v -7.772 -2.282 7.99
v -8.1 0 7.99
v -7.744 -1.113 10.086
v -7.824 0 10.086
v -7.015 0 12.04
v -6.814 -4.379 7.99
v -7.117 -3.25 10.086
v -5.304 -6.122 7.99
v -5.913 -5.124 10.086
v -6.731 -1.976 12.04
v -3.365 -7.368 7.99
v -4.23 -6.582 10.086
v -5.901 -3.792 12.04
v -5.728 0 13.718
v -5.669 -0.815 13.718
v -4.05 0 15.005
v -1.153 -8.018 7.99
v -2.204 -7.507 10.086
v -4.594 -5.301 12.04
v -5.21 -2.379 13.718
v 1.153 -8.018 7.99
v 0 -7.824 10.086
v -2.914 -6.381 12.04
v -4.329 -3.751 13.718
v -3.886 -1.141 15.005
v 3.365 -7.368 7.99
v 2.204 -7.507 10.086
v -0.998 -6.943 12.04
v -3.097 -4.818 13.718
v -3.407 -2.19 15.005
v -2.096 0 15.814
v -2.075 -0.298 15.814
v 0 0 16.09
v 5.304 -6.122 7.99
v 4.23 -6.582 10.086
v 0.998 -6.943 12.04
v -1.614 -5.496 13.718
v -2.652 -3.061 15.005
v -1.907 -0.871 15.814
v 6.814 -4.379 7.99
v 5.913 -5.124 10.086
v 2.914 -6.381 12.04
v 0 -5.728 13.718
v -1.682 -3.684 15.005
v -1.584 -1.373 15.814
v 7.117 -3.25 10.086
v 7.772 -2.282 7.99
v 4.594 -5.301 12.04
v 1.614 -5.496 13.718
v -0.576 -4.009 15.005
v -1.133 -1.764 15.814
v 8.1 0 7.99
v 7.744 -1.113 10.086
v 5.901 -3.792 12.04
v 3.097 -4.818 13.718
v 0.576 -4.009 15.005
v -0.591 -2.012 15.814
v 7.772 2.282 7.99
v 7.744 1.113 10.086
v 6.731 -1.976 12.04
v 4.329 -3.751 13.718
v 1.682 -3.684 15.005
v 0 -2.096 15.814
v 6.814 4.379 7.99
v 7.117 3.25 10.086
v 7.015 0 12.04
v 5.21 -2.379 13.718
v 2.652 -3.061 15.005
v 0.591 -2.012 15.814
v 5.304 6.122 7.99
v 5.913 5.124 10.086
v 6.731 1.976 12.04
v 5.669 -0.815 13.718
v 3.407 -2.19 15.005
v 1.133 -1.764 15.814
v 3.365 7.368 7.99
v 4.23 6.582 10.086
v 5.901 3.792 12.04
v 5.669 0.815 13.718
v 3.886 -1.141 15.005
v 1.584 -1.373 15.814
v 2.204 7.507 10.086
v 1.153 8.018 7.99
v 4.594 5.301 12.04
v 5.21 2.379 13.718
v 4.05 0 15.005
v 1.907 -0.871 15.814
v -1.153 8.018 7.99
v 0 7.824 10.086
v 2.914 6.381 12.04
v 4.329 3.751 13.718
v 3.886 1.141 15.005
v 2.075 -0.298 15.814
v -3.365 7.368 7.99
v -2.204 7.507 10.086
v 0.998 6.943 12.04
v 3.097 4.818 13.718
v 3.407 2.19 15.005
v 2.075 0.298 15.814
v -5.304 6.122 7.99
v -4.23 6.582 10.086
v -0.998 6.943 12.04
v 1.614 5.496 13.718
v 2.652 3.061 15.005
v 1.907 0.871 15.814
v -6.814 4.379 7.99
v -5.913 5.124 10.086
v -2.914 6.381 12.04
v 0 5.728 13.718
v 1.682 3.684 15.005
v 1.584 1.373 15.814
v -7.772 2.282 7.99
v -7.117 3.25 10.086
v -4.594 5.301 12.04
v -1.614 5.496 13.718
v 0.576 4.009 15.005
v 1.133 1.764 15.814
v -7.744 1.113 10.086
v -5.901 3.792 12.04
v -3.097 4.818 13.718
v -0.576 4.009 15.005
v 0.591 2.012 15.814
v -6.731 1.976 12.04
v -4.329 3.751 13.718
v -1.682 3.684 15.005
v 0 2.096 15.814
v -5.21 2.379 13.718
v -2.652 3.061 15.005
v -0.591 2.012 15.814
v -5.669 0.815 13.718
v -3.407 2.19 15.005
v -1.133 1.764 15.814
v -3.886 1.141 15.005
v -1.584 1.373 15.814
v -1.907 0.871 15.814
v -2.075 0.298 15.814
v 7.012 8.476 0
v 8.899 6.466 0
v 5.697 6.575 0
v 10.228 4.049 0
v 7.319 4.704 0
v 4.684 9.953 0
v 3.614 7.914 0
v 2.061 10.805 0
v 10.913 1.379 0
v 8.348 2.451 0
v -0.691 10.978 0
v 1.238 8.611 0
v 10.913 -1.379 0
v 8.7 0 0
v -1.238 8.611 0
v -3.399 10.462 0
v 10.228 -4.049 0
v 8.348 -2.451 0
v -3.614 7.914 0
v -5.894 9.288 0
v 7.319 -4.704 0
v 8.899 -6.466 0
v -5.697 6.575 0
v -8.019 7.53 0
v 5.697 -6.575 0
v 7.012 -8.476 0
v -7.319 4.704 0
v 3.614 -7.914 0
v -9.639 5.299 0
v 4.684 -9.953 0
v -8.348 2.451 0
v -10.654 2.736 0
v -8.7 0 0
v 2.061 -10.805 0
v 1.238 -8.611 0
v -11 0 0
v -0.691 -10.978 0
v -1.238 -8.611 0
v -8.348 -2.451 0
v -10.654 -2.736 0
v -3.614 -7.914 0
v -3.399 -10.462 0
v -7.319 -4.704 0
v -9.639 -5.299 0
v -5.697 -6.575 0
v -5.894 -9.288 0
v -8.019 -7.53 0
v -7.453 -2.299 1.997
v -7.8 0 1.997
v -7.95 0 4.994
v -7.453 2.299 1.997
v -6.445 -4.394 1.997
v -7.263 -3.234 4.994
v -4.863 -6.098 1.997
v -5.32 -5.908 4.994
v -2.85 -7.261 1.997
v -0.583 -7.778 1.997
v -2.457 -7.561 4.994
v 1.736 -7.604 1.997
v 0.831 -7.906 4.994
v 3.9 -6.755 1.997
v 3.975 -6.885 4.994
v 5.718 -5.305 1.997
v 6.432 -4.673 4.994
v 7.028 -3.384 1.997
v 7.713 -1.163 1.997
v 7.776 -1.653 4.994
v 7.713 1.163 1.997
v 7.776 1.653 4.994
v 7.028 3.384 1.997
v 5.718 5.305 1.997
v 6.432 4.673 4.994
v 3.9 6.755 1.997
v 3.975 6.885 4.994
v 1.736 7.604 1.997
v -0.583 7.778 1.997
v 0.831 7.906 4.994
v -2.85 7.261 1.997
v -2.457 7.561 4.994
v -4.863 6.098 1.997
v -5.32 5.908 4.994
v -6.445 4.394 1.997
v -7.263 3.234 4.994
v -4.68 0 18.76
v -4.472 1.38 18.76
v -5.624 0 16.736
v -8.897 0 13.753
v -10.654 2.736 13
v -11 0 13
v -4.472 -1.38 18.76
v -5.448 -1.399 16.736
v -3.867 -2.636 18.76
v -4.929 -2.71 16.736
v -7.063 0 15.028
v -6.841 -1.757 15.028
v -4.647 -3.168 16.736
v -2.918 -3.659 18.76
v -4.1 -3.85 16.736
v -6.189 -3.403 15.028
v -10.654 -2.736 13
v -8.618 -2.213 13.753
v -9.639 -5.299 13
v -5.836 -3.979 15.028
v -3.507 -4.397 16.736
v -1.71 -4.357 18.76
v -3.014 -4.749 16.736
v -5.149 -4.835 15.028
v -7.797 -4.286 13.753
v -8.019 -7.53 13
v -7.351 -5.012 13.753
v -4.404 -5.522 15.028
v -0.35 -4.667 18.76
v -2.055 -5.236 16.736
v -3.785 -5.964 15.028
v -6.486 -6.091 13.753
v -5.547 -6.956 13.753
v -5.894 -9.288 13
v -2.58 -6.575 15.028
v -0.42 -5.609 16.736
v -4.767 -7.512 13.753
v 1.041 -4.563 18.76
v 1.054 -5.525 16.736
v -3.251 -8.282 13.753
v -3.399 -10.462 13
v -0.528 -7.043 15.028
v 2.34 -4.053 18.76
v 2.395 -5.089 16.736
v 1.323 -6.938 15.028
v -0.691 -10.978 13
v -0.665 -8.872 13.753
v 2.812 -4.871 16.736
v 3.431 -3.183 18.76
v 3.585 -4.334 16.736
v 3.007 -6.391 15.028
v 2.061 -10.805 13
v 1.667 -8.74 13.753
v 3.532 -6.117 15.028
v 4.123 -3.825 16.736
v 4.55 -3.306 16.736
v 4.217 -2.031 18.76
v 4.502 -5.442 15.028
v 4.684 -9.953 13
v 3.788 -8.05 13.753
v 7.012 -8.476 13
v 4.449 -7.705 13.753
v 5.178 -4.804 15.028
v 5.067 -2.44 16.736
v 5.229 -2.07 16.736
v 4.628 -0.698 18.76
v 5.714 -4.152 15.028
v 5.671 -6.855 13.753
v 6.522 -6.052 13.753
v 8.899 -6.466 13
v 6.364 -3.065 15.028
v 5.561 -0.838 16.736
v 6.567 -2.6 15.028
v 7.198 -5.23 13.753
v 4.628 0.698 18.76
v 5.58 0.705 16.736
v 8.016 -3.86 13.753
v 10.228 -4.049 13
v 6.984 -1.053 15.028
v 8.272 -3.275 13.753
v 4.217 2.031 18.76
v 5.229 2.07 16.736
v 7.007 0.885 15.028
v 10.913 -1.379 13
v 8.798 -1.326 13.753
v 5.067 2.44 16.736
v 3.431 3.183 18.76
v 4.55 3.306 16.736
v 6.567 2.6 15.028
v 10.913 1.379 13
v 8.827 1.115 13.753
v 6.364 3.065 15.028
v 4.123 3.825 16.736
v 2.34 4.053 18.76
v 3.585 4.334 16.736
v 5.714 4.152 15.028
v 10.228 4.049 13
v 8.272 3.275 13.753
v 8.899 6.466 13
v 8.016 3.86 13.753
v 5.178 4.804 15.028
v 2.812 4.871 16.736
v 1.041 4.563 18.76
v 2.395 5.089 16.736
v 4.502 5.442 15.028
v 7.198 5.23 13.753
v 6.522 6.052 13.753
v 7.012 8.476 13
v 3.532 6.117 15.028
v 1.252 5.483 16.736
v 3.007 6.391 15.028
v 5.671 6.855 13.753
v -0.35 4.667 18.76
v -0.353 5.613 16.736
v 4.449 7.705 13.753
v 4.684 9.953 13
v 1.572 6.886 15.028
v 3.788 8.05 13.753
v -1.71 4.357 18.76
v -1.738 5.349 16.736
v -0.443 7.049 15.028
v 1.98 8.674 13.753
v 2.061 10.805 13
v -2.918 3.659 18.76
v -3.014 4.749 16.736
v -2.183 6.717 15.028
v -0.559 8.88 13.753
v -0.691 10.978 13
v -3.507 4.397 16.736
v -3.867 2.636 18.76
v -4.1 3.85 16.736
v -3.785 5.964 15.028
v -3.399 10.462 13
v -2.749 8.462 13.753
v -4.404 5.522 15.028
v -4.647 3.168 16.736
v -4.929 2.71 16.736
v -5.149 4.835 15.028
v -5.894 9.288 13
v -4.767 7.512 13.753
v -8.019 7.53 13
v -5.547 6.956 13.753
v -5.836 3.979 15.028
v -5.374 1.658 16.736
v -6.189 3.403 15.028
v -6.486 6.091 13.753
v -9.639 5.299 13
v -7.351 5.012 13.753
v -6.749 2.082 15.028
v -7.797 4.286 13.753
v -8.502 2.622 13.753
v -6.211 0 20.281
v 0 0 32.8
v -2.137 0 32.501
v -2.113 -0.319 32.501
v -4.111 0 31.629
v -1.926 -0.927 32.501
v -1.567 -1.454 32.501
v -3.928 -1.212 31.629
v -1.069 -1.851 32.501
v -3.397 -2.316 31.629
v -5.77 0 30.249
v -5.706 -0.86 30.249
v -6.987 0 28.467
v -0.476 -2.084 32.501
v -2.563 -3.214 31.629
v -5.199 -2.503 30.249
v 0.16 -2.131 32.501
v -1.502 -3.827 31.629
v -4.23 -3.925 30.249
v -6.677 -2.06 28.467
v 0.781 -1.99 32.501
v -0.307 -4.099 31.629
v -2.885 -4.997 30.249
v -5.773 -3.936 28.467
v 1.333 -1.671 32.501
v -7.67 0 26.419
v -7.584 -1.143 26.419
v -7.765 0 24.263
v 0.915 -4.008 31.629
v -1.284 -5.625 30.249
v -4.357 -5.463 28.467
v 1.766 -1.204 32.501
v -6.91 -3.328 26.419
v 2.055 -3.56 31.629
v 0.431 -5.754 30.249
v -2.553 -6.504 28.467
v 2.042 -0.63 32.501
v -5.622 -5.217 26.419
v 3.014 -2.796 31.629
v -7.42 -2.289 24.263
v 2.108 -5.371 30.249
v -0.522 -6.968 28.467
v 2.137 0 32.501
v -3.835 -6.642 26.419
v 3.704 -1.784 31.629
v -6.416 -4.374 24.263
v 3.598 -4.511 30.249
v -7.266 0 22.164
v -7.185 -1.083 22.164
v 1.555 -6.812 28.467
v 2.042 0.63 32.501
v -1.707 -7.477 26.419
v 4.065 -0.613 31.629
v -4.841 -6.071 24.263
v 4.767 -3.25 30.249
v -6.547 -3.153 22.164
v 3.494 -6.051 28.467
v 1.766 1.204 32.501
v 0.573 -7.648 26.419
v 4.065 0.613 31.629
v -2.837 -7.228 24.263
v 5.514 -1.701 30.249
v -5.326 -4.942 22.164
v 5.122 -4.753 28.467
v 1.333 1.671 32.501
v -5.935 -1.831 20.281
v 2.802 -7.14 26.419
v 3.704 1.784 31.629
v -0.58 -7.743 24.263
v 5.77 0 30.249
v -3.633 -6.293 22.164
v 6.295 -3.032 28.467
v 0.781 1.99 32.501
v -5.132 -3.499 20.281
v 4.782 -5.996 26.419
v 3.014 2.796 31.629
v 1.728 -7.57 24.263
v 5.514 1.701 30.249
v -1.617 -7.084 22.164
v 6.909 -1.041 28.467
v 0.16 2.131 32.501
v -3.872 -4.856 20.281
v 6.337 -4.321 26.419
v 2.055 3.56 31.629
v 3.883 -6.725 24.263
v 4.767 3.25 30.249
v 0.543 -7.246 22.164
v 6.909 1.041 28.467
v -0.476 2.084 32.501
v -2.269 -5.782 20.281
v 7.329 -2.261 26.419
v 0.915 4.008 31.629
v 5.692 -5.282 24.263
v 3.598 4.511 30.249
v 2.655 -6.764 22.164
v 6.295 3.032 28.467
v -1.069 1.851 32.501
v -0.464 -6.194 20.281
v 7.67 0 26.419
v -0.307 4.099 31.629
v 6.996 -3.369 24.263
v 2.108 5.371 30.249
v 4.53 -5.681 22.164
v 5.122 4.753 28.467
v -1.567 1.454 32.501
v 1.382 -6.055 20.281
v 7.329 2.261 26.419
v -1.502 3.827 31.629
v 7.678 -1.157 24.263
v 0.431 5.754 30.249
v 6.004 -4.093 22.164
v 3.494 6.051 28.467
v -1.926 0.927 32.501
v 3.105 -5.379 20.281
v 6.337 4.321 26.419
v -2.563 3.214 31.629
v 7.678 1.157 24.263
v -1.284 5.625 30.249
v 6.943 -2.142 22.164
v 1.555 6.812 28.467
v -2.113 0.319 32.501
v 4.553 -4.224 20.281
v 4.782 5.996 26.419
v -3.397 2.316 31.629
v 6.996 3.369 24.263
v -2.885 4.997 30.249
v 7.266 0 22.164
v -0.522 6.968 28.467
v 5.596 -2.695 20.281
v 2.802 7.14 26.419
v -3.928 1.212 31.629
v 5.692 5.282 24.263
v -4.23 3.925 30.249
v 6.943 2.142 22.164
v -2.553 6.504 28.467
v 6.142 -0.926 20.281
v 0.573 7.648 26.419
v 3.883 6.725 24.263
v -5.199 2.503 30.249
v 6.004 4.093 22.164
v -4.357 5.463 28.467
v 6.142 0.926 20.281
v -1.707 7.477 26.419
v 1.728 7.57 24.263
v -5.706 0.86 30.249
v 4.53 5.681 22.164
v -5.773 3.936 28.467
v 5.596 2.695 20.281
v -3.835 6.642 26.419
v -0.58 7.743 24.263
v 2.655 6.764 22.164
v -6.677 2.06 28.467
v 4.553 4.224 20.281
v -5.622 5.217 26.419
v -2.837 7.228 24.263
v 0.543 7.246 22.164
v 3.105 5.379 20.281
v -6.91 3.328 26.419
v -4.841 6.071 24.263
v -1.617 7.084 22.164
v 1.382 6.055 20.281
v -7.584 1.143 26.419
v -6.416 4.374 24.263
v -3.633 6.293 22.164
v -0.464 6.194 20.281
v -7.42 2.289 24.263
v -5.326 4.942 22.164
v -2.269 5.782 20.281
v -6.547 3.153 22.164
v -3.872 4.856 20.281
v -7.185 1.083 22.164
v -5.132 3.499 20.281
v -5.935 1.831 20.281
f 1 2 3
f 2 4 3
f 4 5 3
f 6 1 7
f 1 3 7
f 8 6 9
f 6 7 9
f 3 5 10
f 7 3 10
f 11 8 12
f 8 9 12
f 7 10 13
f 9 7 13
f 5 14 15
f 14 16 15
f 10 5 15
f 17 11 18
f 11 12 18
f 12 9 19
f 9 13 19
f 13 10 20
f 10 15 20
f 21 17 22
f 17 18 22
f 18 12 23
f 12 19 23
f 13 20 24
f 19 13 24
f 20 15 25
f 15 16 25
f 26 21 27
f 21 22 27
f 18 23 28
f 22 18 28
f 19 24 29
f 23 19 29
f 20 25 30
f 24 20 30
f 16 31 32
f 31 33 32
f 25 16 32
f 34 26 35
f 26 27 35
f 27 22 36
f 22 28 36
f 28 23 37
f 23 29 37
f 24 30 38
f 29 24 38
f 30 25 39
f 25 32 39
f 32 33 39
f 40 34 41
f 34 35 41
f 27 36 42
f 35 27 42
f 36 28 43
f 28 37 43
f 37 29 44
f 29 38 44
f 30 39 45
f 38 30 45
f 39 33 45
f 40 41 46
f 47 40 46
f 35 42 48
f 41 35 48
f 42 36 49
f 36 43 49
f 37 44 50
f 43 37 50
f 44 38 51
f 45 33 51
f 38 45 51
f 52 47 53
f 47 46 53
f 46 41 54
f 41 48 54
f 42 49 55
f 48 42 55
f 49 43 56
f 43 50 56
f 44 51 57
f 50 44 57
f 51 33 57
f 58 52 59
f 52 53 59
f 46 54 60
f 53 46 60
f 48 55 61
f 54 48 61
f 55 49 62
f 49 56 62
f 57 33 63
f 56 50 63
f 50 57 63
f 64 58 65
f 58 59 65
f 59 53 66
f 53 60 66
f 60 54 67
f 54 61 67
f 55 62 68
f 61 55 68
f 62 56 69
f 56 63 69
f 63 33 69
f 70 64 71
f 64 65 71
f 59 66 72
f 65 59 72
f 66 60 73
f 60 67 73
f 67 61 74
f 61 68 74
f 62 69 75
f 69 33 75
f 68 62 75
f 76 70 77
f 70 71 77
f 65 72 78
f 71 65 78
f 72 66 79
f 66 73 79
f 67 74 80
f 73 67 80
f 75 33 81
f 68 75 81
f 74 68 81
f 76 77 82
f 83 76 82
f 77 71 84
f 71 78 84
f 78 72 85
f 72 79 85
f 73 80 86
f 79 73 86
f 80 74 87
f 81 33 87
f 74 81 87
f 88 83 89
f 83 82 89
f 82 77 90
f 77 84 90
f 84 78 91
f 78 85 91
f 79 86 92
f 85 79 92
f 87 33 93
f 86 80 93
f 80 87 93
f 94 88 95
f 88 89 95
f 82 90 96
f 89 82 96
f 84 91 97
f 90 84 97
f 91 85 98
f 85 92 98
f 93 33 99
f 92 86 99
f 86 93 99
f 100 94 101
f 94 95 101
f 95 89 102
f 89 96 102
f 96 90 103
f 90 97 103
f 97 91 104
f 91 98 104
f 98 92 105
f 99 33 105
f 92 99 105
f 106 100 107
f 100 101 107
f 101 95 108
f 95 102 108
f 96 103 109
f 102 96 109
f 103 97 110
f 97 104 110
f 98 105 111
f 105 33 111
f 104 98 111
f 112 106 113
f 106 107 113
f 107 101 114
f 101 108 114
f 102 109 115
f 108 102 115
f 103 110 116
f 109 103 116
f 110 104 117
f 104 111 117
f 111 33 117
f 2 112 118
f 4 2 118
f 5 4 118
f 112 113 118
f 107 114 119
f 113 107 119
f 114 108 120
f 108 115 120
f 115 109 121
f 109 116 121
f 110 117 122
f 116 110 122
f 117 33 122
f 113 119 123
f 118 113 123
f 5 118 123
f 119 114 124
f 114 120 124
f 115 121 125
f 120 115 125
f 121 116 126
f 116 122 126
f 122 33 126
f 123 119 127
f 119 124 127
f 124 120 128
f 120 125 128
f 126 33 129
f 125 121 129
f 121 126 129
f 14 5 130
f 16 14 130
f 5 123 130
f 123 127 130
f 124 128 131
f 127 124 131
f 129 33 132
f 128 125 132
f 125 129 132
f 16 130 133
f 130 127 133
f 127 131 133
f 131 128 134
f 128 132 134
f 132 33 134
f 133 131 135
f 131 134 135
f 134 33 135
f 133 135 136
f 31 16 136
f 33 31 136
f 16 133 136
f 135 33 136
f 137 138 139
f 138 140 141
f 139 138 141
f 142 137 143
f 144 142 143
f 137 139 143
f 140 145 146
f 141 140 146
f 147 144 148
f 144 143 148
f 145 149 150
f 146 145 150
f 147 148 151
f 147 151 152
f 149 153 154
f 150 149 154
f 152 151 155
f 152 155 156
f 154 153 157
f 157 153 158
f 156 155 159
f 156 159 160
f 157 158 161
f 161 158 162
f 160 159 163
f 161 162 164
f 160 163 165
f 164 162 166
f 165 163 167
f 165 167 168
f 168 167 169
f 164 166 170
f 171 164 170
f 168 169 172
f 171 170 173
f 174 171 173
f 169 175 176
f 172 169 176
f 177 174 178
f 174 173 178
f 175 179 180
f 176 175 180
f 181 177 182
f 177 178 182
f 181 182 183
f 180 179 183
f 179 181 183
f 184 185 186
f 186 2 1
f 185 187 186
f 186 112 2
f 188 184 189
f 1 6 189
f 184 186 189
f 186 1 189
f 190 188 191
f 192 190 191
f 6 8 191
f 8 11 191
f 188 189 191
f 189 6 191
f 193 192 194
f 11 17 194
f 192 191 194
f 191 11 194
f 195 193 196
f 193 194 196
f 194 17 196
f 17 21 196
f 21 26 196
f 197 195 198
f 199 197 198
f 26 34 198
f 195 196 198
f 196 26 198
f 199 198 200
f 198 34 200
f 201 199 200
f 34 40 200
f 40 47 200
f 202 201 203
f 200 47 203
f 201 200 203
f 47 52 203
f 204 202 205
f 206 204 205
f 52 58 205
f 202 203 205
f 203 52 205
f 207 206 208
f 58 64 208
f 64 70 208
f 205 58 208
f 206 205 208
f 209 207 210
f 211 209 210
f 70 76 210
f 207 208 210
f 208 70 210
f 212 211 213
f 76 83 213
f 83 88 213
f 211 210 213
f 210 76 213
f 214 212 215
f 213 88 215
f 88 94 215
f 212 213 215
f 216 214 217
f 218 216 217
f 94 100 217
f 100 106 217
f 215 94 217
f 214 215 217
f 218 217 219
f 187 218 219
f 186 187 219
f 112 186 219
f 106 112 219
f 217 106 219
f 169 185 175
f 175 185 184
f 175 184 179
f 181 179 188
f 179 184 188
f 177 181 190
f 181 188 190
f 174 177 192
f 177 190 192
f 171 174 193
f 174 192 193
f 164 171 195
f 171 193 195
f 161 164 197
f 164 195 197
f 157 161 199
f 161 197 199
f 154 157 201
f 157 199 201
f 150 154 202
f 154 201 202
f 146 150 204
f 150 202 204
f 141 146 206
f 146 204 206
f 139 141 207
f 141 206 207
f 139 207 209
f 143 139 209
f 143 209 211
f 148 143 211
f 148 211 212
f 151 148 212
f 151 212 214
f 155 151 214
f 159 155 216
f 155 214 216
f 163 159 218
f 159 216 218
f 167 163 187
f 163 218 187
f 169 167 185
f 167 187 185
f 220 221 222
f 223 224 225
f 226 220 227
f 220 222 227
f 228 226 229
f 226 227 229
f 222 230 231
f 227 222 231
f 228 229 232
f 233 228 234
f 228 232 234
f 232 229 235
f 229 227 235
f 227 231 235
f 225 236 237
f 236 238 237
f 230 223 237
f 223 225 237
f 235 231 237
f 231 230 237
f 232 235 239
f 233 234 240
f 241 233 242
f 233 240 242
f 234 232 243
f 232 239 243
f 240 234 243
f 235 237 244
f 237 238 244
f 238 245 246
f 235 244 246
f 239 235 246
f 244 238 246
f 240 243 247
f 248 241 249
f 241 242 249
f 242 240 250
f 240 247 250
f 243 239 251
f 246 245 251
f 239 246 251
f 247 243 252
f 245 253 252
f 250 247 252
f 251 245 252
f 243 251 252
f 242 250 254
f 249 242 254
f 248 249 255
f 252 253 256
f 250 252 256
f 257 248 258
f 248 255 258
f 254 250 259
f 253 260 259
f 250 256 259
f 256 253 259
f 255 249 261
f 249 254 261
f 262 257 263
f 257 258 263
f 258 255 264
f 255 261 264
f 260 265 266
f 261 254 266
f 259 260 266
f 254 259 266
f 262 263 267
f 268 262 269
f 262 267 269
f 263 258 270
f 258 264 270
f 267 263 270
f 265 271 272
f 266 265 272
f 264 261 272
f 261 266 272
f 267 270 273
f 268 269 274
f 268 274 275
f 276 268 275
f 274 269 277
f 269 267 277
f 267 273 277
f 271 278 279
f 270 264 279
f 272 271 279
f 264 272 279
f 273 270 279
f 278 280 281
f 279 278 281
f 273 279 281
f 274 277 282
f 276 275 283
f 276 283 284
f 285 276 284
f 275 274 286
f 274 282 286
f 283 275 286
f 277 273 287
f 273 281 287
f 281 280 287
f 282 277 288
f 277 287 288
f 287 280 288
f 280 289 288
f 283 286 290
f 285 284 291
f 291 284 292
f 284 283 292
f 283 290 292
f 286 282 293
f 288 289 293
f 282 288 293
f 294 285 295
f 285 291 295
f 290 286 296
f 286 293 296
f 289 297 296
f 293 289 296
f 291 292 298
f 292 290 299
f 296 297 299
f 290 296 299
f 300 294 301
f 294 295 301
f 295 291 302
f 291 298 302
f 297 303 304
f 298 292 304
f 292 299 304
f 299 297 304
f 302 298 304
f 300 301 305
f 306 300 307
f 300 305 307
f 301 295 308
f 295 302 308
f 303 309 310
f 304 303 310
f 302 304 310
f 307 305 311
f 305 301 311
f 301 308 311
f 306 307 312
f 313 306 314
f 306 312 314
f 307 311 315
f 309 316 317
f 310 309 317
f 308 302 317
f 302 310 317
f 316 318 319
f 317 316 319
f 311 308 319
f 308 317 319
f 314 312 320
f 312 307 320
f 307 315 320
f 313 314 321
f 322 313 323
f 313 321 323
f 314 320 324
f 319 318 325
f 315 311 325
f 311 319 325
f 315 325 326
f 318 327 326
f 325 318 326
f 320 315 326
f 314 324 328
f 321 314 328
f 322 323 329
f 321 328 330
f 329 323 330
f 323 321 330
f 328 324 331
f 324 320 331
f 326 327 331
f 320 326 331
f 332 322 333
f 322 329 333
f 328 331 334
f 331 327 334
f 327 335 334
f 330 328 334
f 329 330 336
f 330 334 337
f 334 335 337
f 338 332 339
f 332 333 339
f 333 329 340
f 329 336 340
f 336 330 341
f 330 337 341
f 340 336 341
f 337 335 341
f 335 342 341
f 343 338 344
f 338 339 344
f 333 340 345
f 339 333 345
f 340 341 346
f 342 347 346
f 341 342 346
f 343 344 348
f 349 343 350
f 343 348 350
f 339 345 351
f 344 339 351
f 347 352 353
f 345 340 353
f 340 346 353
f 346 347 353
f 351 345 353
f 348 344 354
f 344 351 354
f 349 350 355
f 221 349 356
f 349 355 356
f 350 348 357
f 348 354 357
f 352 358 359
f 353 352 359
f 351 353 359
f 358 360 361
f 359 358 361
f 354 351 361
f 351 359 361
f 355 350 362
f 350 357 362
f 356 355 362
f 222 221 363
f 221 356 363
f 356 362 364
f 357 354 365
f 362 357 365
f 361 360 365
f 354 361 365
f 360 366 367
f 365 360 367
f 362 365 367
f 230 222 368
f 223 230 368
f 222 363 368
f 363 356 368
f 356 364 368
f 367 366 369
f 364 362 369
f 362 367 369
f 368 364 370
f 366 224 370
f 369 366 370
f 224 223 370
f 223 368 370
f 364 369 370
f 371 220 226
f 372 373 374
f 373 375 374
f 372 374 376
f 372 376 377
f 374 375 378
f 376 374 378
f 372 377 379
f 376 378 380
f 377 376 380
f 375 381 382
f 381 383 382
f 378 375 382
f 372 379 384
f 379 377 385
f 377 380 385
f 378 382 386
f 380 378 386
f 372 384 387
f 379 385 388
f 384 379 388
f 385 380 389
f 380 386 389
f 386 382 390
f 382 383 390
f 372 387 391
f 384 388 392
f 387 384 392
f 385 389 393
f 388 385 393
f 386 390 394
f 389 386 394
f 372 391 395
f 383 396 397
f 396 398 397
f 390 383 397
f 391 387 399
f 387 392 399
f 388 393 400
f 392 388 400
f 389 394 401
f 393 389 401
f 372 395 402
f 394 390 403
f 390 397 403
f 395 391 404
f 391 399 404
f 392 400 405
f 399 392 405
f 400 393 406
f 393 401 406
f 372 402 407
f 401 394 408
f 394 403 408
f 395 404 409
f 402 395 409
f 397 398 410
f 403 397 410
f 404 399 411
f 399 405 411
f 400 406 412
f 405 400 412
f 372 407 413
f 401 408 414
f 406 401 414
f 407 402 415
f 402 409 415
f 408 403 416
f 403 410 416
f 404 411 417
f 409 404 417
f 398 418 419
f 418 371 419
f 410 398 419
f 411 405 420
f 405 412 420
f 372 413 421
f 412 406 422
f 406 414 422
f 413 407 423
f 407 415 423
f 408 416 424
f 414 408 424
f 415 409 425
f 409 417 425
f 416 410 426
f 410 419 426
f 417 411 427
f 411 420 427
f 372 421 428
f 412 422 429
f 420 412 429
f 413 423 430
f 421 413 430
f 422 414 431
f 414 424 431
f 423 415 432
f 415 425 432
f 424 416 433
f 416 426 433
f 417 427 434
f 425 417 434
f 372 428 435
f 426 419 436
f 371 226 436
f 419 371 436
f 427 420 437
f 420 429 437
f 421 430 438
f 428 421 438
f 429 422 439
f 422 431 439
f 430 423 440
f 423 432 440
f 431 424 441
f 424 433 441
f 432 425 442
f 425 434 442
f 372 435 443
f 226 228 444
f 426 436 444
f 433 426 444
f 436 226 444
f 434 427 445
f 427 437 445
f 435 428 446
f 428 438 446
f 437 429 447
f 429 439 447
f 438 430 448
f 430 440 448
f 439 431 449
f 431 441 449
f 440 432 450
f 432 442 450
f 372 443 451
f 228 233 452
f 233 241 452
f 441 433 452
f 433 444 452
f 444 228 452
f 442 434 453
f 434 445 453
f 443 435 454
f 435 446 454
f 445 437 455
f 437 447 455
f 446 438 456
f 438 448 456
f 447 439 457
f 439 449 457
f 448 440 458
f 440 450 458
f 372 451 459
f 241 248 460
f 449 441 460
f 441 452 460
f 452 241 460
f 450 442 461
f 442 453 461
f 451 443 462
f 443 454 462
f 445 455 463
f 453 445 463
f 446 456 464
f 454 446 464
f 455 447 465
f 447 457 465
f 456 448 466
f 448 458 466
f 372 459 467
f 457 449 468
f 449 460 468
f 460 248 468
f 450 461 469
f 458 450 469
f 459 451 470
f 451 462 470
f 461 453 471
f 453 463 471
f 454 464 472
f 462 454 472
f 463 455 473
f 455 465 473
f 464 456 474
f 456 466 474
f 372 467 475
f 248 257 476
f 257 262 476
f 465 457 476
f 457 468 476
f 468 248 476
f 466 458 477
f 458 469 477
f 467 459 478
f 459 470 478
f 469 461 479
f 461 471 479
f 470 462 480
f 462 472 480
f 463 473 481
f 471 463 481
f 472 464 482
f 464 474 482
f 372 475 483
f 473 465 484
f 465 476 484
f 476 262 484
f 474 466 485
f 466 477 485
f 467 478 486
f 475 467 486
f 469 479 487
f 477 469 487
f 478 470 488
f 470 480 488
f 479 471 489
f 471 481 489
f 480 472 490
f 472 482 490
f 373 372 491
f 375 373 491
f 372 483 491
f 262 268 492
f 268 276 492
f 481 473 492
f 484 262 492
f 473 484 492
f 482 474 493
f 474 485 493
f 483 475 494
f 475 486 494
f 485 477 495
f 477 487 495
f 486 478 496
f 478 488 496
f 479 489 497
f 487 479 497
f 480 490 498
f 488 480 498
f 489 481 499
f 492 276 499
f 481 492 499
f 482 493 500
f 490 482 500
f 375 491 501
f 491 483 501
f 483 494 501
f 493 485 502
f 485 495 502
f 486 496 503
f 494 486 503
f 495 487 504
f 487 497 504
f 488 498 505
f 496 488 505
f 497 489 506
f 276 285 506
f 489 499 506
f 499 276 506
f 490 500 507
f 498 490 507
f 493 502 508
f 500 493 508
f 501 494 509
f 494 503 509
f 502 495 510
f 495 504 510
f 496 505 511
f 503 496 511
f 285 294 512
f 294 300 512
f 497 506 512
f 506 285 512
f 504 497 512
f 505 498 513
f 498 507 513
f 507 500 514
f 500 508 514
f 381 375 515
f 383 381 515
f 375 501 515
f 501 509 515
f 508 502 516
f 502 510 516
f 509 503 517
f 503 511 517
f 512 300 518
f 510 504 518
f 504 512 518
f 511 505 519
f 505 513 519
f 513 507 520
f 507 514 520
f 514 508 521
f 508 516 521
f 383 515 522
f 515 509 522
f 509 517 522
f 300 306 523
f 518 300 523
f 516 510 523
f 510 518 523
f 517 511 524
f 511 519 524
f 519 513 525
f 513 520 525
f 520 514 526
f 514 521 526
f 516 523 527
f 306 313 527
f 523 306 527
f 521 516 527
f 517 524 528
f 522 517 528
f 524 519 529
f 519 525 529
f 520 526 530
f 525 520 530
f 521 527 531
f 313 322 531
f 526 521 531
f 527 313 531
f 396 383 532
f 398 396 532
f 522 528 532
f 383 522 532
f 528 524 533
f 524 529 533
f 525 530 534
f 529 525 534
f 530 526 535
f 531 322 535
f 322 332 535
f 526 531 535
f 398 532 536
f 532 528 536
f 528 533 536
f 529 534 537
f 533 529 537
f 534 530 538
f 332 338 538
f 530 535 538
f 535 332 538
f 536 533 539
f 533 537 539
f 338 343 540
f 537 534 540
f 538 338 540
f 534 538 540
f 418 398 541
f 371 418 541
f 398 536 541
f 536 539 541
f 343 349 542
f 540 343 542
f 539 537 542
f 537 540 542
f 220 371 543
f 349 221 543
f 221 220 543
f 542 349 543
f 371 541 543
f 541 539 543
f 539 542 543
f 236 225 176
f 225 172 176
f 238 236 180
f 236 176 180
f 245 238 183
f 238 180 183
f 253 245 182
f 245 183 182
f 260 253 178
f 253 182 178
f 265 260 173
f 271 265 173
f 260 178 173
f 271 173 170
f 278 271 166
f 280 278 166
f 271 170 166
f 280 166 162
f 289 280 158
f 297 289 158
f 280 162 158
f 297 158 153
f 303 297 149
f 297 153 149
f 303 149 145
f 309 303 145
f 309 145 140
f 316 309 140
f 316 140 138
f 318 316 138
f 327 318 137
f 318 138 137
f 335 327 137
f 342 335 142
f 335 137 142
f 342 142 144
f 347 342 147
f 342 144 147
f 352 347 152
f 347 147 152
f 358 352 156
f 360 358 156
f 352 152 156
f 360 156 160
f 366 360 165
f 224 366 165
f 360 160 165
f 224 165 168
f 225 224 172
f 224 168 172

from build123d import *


# Not quite as in the source:
# - a fillet or chamfer that OpenCascade refuses, or shapes differently, is made with other operations: its cross-section is extruded or revolved along the edge and cut away or added
# - a feature names something its author has since deleted; it is built from what else it names


with BuildPart() as f1:
    # F0 (on Front) → F1 (revolve)
    with BuildSketch(Plane.XZ):
        with BuildLine():
            Line((-11, 13), (-11, 0))
            Line((-11, 0), (-7.7, 0))
            Line((-7.7, 0), (-8.1, 7.9899937422))
            ThreePointArc((-8.1, 7.9899937422), (-5.7275649276, 13.7175586698), (0, 16.0899937422))
            Line((0, 16.0899937422), (0, 17.2))
            ThreePointArc((0, 17.2), (-2.4667280394, 17.6003207651), (-4.680255449, 18.7601915949))
            ThreePointArc((-4.680255449, 18.7601915949), (-7.0630577198, 15.0275401408), (-11, 13))
        make_face()
        with BuildLine():
            ThreePointArc((0, 32.8), (-7.3996792349, 27.4667280394), (-4.680255449, 18.7601915949))
            ThreePointArc((-4.680255449, 18.7601915949), (-2.4667280394, 17.6003207651), (0, 17.2))
            Line((0, 17.2), (0, 32.8))
        make_face()
    revolve(axis=Axis((0, 0, 29.5921396464), (0, 0, 1)))

    # F2: chamfer of 2 x 1 on 1 edges, made by hand

    # F2_s1 → F2_t2 (revolve, cut)
    with BuildSketch(Plane.XZ):
        Polygon((-8.7, 0), (-7.8, 1.9974984355), (-7.7, 0), align=None)
    revolve(axis=Axis((0, 0, 0), (0, 0, 1)), mode=Mode.SUBTRACT)


solid = f1.part
